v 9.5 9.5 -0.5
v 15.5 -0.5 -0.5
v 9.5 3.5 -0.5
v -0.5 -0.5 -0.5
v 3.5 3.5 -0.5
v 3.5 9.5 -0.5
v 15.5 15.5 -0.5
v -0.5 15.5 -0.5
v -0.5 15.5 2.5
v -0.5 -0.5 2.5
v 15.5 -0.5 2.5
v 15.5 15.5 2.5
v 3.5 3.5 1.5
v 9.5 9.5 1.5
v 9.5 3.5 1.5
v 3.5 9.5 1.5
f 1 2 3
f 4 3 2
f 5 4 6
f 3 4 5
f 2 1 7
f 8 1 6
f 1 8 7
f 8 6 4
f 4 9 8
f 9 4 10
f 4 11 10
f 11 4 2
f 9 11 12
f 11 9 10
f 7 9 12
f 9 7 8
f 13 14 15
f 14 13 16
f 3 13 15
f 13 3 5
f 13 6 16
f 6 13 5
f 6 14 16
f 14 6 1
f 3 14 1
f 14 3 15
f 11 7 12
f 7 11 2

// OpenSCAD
union() {
    translate([0, 0, 0]) color("brown") cube([1, 1, 1],center=true);
    translate([0, 0, 1]) color("brown") cube([1, 1, 1],center=true);
    translate([0, 0, 2]) color("brown") cube([1, 1, 1],center=true);
    translate([0, 1, 0]) color("brown") cube([1, 1, 1],center=true);
    translate([0, 1, 1]) color("brown") cube([1, 1, 1],center=true);
    translate([0, 1, 2]) color("brown") cube([1, 1, 1],center=true);
    translate([0, 2, 0]) color("brown") cube([1, 1, 1],center=true);
    translate([0, 2, 1]) color("brown") cube([1, 1, 1],center=true);
    translate([0, 2, 2]) color("brown") cube([1, 1, 1],center=true);
    translate([0, 3, 0]) color("brown") cube([1, 1, 1],center=true);
    translate([0, 3, 1]) color("brown") cube([1, 1, 1],center=true);
    translate([0, 3, 2]) color("brown") cube([1, 1, 1],center=true);
    translate([0, 4, 0]) color("brown") cube([1, 1, 1],center=true);
    translate([0, 4, 1]) color("brown") cube([1, 1, 1],center=true);
    translate([0, 4, 2]) color("brown") cube([1, 1, 1],center=true);
    translate([0, 5, 0]) color("brown") cube([1, 1, 1],center=true);
    translate([0, 5, 1]) color("brown") cube([1, 1, 1],center=true);
    translate([0, 5, 2]) color("brown") cube([1, 1, 1],center=true);
    translate([0, 6, 0]) color("brown") cube([1, 1, 1],center=true);
    translate([0, 6, 1]) color("brown") cube([1, 1, 1],center=true);
    translate([0, 6, 2]) color("brown") cube([1, 1, 1],center=true);
    translate([0, 7, 0]) color("brown") cube([1, 1, 1],center=true);
    translate([0, 7, 1]) color("brown") cube([1, 1, 1],center=true);
    translate([0, 7, 2]) color("brown") cube([1, 1, 1],center=true);
    translate([0, 8, 0]) color("brown") cube([1, 1, 1],center=true);
    translate([0, 8, 1]) color("brown") cube([1, 1, 1],center=true);
    translate([0, 8, 2]) color("brown") cube([1, 1, 1],center=true);
    translate([0, 9, 0]) color("brown") cube([1, 1, 1],center=true);
    translate([0, 9, 1]) color("brown") cube([1, 1, 1],center=true);
    translate([0, 9, 2]) color("brown") cube([1, 1, 1],center=true);
    translate([0, 10, 0]) color("brown") cube([1, 1, 1],center=true);
    translate([0, 10, 1]) color("brown") cube([1, 1, 1],center=true);
    translate([0, 10, 2]) color("brown") cube([1, 1, 1],center=true);
    translate([0, 11, 0]) color("brown") cube([1, 1, 1],center=true);
    translate([0, 11, 1]) color("brown") cube([1, 1, 1],center=true);
    translate([0, 11, 2]) color("brown") cube([1, 1, 1],center=true);
    translate([0, 12, 0]) color("brown") cube([1, 1, 1],center=true);
    translate([0, 12, 1]) color("brown") cube([1, 1, 1],center=true);
    translate([0, 12, 2]) color("brown") cube([1, 1, 1],center=true);
    translate([0, 13, 0]) color("brown") cube([1, 1, 1],center=true);
    translate([0, 13, 1]) color("brown") cube([1, 1, 1],center=true);
    translate([0, 13, 2]) color("brown") cube([1, 1, 1],center=true);
    translate([0, 14, 0]) color("brown") cube([1, 1, 1],center=true);
    translate([0, 14, 1]) color("brown") cube([1, 1, 1],center=true);
    translate([0, 14, 2]) color("brown") cube([1, 1, 1],center=true);
    translate([0, 15, 0]) color("brown") cube([1, 1, 1],center=true);
    translate([0, 15, 1]) color("brown") cube([1, 1, 1],center=true);
    translate([0, 15, 2]) color("brown") cube([1, 1, 1],center=true);
    translate([1, 0, 0]) color("brown") cube([1, 1, 1],center=true);
    translate([1, 0, 1]) color("brown") cube([1, 1, 1],center=true);
    translate([1, 0, 2]) color("brown") cube([1, 1, 1],center=true);
    translate([1, 1, 0]) color("brown") cube([1, 1, 1],center=true);
    translate([1, 1, 1]) color("brown") cube([1, 1, 1],center=true);
    translate([1, 1, 2]) color("brown") cube([1, 1, 1],center=true);
    translate([1, 2, 0]) color("brown") cube([1, 1, 1],center=true);
    translate([1, 2, 1]) color("brown") cube([1, 1, 1],center=true);
    translate([1, 2, 2]) color("brown") cube([1, 1, 1],center=true);
    translate([1, 3, 0]) color("brown") cube([1, 1, 1],center=true);
    translate([1, 3, 1]) color("brown") cube([1, 1, 1],center=true);
    translate([1, 3, 2]) color("brown") cube([1, 1, 1],center=true);
    translate([1, 4, 0]) color("brown") cube([1, 1, 1],center=true);
    translate([1, 4, 1]) color("brown") cube([1, 1, 1],center=true);
    translate([1, 4, 2]) color("brown") cube([1, 1, 1],center=true);
    translate([1, 5, 0]) color("brown") cube([1, 1, 1],center=true);
    translate([1, 5, 1]) color("brown") cube([1, 1, 1],center=true);
    translate([1, 5, 2]) color("brown") cube([1, 1, 1],center=true);
    translate([1, 6, 0]) color("brown") cube([1, 1, 1],center=true);
    translate([1, 6, 1]) color("brown") cube([1, 1, 1],center=true);
    translate([1, 6, 2]) color("brown") cube([1, 1, 1],center=true);
    translate([1, 7, 0]) color("brown") cube([1, 1, 1],center=true);
    translate([1, 7, 1]) color("brown") cube([1, 1, 1],center=true);
    translate([1, 7, 2]) color("brown") cube([1, 1, 1],center=true);
    translate([1, 8, 0]) color("brown") cube([1, 1, 1],center=true);
    translate([1, 8, 1]) color("brown") cube([1, 1, 1],center=true);
    translate([1, 8, 2]) color("brown") cube([1, 1, 1],center=true);
    translate([1, 9, 0]) color("brown") cube([1, 1, 1],center=true);
    translate([1, 9, 1]) color("brown") cube([1, 1, 1],center=true);
    translate([1, 9, 2]) color("brown") cube([1, 1, 1],center=true);
    translate([1, 10, 0]) color("brown") cube([1, 1, 1],center=true);
    translate([1, 10, 1]) color("brown") cube([1, 1, 1],center=true);
    translate([1, 10, 2]) color("brown") cube([1, 1, 1],center=true);
    translate([1, 11, 0]) color("brown") cube([1, 1, 1],center=true);
    translate([1, 11, 1]) color("brown") cube([1, 1, 1],center=true);
    translate([1, 11, 2]) color("brown") cube([1, 1, 1],center=true);
    translate([1, 12, 0]) color("brown") cube([1, 1, 1],center=true);
    translate([1, 12, 1]) color("brown") cube([1, 1, 1],center=true);
    translate([1, 12, 2]) color("brown") cube([1, 1, 1],center=true);
    translate([1, 13, 0]) color("brown") cube([1, 1, 1],center=true);
    translate([1, 13, 1]) color("brown") cube([1, 1, 1],center=true);
    translate([1, 13, 2]) color("brown") cube([1, 1, 1],center=true);
    translate([1, 14, 0]) color("brown") cube([1, 1, 1],center=true);
    translate([1, 14, 1]) color("brown") cube([1, 1, 1],center=true);
    translate([1, 14, 2]) color("brown") cube([1, 1, 1],center=true);
    translate([1, 15, 0]) color("brown") cube([1, 1, 1],center=true);
    translate([1, 15, 1]) color("brown") cube([1, 1, 1],center=true);
    translate([1, 15, 2]) color("brown") cube([1, 1, 1],center=true);
    translate([2, 0, 0]) color("brown") cube([1, 1, 1],center=true);
    translate([2, 0, 1]) color("brown") cube([1, 1, 1],center=true);
    translate([2, 0, 2]) color("brown") cube([1, 1, 1],center=true);
    translate([2, 1, 0]) color("brown") cube([1, 1, 1],center=true);
    translate([2, 1, 1]) color("brown") cube([1, 1, 1],center=true);
    translate([2, 1, 2]) color("brown") cube([1, 1, 1],center=true);
    translate([2, 2, 0]) color("brown") cube([1, 1, 1],center=true);
    translate([2, 2, 1]) color("brown") cube([1, 1, 1],center=true);
    translate([2, 2, 2]) color("brown") cube([1, 1, 1],center=true);
    translate([2, 3, 0]) color("brown") cube([1, 1, 1],center=true);
    translate([2, 3, 1]) color("brown") cube([1, 1, 1],center=true);
    translate([2, 3, 2]) color("brown") cube([1, 1, 1],center=true);
    translate([2, 4, 0]) color("brown") cube([1, 1, 1],center=true);
    translate([2, 4, 1]) color("brown") cube([1, 1, 1],center=true);
    translate([2, 4, 2]) color("brown") cube([1, 1, 1],center=true);
    translate([2, 5, 0]) color("brown") cube([1, 1, 1],center=true);
    translate([2, 5, 1]) color("brown") cube([1, 1, 1],center=true);
    translate([2, 5, 2]) color("brown") cube([1, 1, 1],center=true);
    translate([2, 6, 0]) color("brown") cube([1, 1, 1],center=true);
    translate([2, 6, 1]) color("brown") cube([1, 1, 1],center=true);
    translate([2, 6, 2]) color("brown") cube([1, 1, 1],center=true);
    translate([2, 7, 0]) color("brown") cube([1, 1, 1],center=true);
    translate([2, 7, 1]) color("brown") cube([1, 1, 1],center=true);
    translate([2, 7, 2]) color("brown") cube([1, 1, 1],center=true);
    translate([2, 8, 0]) color("brown") cube([1, 1, 1],center=true);
    translate([2, 8, 1]) color("brown") cube([1, 1, 1],center=true);
    translate([2, 8, 2]) color("brown") cube([1, 1, 1],center=true);
    translate([2, 9, 0]) color("brown") cube([1, 1, 1],center=true);
    translate([2, 9, 1]) color("brown") cube([1, 1, 1],center=true);
    translate([2, 9, 2]) color("brown") cube([1, 1, 1],center=true);
    translate([2, 10, 0]) color("brown") cube([1, 1, 1],center=true);
    translate([2, 10, 1]) color("brown") cube([1, 1, 1],center=true);
    translate([2, 10, 2]) color("brown") cube([1, 1, 1],center=true);
    translate([2, 11, 0]) color("brown") cube([1, 1, 1],center=true);
    translate([2, 11, 1]) color("brown") cube([1, 1, 1],center=true);
    translate([2, 11, 2]) color("brown") cube([1, 1, 1],center=true);
    translate([2, 12, 0]) color("brown") cube([1, 1, 1],center=true);
    translate([2, 12, 1]) color("brown") cube([1, 1, 1],center=true);
    translate([2, 12, 2]) color("brown") cube([1, 1, 1],center=true);
    translate([2, 13, 0]) color("brown") cube([1, 1, 1],center=true);
    translate([2, 13, 1]) color("brown") cube([1, 1, 1],center=true);
    translate([2, 13, 2]) color("brown") cube([1, 1, 1],center=true);
    translate([2, 14, 0]) color("brown") cube([1, 1, 1],center=true);
    translate([2, 14, 1]) color("brown") cube([1, 1, 1],center=true);
    translate([2, 14, 2]) color("brown") cube([1, 1, 1],center=true);
    translate([2, 15, 0]) color("brown") cube([1, 1, 1],center=true);
    translate([2, 15, 1]) color("brown") cube([1, 1, 1],center=true);
    translate([2, 15, 2]) color("brown") cube([1, 1, 1],center=true);
    translate([3, 0, 0]) color("brown") cube([1, 1, 1],center=true);
    translate([3, 0, 1]) color("brown") cube([1, 1, 1],center=true);
    translate([3, 0, 2]) color("brown") cube([1, 1, 1],center=true);
    translate([3, 1, 0]) color("brown") cube([1, 1, 1],center=true);
    translate([3, 1, 1]) color("brown") cube([1, 1, 1],center=true);
    translate([3, 1, 2]) color("brown") cube([1, 1, 1],center=true);
    translate([3, 2, 0]) color("brown") cube([1, 1, 1],center=true);
    translate([3, 2, 1]) color("brown") cube([1, 1, 1],center=true);
    translate([3, 2, 2]) color("brown") cube([1, 1, 1],center=true);
    translate([3, 3, 0]) color("brown") cube([1, 1, 1],center=true);
    translate([3, 3, 1]) color("brown") cube([1, 1, 1],center=true);
    translate([3, 3, 2]) color("brown") cube([1, 1, 1],center=true);
    translate([3, 4, 0]) color("brown") cube([1, 1, 1],center=true);
    translate([3, 4, 1]) color("brown") cube([1, 1, 1],center=true);
    translate([3, 4, 2]) color("brown") cube([1, 1, 1],center=true);
    translate([3, 5, 0]) color("brown") cube([1, 1, 1],center=true);
    translate([3, 5, 1]) color("brown") cube([1, 1, 1],center=true);
    translate([3, 5, 2]) color("brown") cube([1, 1, 1],center=true);
    translate([3, 6, 0]) color("brown") cube([1, 1, 1],center=true);
    translate([3, 6, 1]) color("brown") cube([1, 1, 1],center=true);
    translate([3, 6, 2]) color("brown") cube([1, 1, 1],center=true);
    translate([3, 7, 0]) color("brown") cube([1, 1, 1],center=true);
    translate([3, 7, 1]) color("brown") cube([1, 1, 1],center=true);
    translate([3, 7, 2]) color("brown") cube([1, 1, 1],center=true);
    translate([3, 8, 0]) color("brown") cube([1, 1, 1],center=true);
    translate([3, 8, 1]) color("brown") cube([1, 1, 1],center=true);
    translate([3, 8, 2]) color("brown") cube([1, 1, 1],center=true);
    translate([3, 9, 0]) color("brown") cube([1, 1, 1],center=true);
    translate([3, 9, 1]) color("brown") cube([1, 1, 1],center=true);
    translate([3, 9, 2]) color("brown") cube([1, 1, 1],center=true);
    translate([3, 10, 0]) color("brown") cube([1, 1, 1],center=true);
    translate([3, 10, 1]) color("brown") cube([1, 1, 1],center=true);
    translate([3, 10, 2]) color("brown") cube([1, 1, 1],center=true);
    translate([3, 11, 0]) color("brown") cube([1, 1, 1],center=true);
    translate([3, 11, 1]) color("brown") cube([1, 1, 1],center=true);
    translate([3, 11, 2]) color("brown") cube([1, 1, 1],center=true);
    translate([3, 12, 0]) color("brown") cube([1, 1, 1],center=true);
    translate([3, 12, 1]) color("brown") cube([1, 1, 1],center=true);
    translate([3, 12, 2]) color("brown") cube([1, 1, 1],center=true);
    translate([3, 13, 0]) color("brown") cube([1, 1, 1],center=true);
    translate([3, 13, 1]) color("brown") cube([1, 1, 1],center=true);
    translate([3, 13, 2]) color("brown") cube([1, 1, 1],center=true);
    translate([3, 14, 0]) color("brown") cube([1, 1, 1],center=true);
    translate([3, 14, 1]) color("brown") cube([1, 1, 1],center=true);
    translate([3, 14, 2]) color("brown") cube([1, 1, 1],center=true);
    translate([3, 15, 0]) color("brown") cube([1, 1, 1],center=true);
    translate([3, 15, 1]) color("brown") cube([1, 1, 1],center=true);
    translate([3, 15, 2]) color("brown") cube([1, 1, 1],center=true);
    translate([4, 0, 0]) color("brown") cube([1, 1, 1],center=true);
    translate([4, 0, 1]) color("brown") cube([1, 1, 1],center=true);
    translate([4, 0, 2]) color("brown") cube([1, 1, 1],center=true);
    translate([4, 1, 0]) color("brown") cube([1, 1, 1],center=true);
    translate([4, 1, 1]) color("brown") cube([1, 1, 1],center=true);
    translate([4, 1, 2]) color("brown") cube([1, 1, 1],center=true);
    translate([4, 2, 0]) color("brown") cube([1, 1, 1],center=true);
    translate([4, 2, 1]) color("brown") cube([1, 1, 1],center=true);
    translate([4, 2, 2]) color("brown") cube([1, 1, 1],center=true);
    translate([4, 3, 0]) color("brown") cube([1, 1, 1],center=true);
    translate([4, 3, 1]) color("brown") cube([1, 1, 1],center=true);
    translate([4, 3, 2]) color("brown") cube([1, 1, 1],center=true);
    translate([4, 4, 2]) color("brown") cube([1, 1, 1],center=true);
    translate([4, 5, 2]) color("brown") cube([1, 1, 1],center=true);
    translate([4, 6, 2]) color("brown") cube([1, 1, 1],center=true);
    translate([4, 7, 2]) color("brown") cube([1, 1, 1],center=true);
    translate([4, 8, 2]) color("brown") cube([1, 1, 1],center=true);
    translate([4, 9, 2]) color("brown") cube([1, 1, 1],center=true);
    translate([4, 10, 0]) color("brown") cube([1, 1, 1],center=true);
    translate([4, 10, 1]) color("brown") cube([1, 1, 1],center=true);
    translate([4, 10, 2]) color("brown") cube([1, 1, 1],center=true);
    translate([4, 11, 0]) color("brown") cube([1, 1, 1],center=true);
    translate([4, 11, 1]) color("brown") cube([1, 1, 1],center=true);
    translate([4, 11, 2]) color("brown") cube([1, 1, 1],center=true);
    translate([4, 12, 0]) color("brown") cube([1, 1, 1],center=true);
    translate([4, 12, 1]) color("brown") cube([1, 1, 1],center=true);
    translate([4, 12, 2]) color("brown") cube([1, 1, 1],center=true);
    translate([4, 13, 0]) color("brown") cube([1, 1, 1],center=true);
    translate([4, 13, 1]) color("brown") cube([1, 1, 1],center=true);
    translate([4, 13, 2]) color("brown") cube([1, 1, 1],center=true);
    translate([4, 14, 0]) color("brown") cube([1, 1, 1],center=true);
    translate([4, 14, 1]) color("brown") cube([1, 1, 1],center=true);
    translate([4, 14, 2]) color("brown") cube([1, 1, 1],center=true);
    translate([4, 15, 0]) color("brown") cube([1, 1, 1],center=true);
    translate([4, 15, 1]) color("brown") cube([1, 1, 1],center=true);
    translate([4, 15, 2]) color("brown") cube([1, 1, 1],center=true);
    translate([5, 0, 0]) color("brown") cube([1, 1, 1],center=true);
    translate([5, 0, 1]) color("brown") cube([1, 1, 1],center=true);
    translate([5, 0, 2]) color("brown") cube([1, 1, 1],center=true);
    translate([5, 1, 0]) color("brown") cube([1, 1, 1],center=true);
    translate([5, 1, 1]) color("brown") cube([1, 1, 1],center=true);
    translate([5, 1, 2]) color("brown") cube([1, 1, 1],center=true);
    translate([5, 2, 0]) color("brown") cube([1, 1, 1],center=true);
    translate([5, 2, 1]) color("brown") cube([1, 1, 1],center=true);
    translate([5, 2, 2]) color("brown") cube([1, 1, 1],center=true);
    translate([5, 3, 0]) color("brown") cube([1, 1, 1],center=true);
    translate([5, 3, 1]) color("brown") cube([1, 1, 1],center=true);
    translate([5, 3, 2]) color("brown") cube([1, 1, 1],center=true);
    translate([5, 4, 2]) color("brown") cube([1, 1, 1],center=true);
    translate([5, 5, 2]) color("brown") cube([1, 1, 1],center=true);
    translate([5, 6, 2]) color("brown") cube([1, 1, 1],center=true);
    translate([5, 7, 2]) color("brown") cube([1, 1, 1],center=true);
    translate([5, 8, 2]) color("brown") cube([1, 1, 1],center=true);
    translate([5, 9, 2]) color("brown") cube([1, 1, 1],center=true);
    translate([5, 10, 0]) color("brown") cube([1, 1, 1],center=true);
    translate([5, 10, 1]) color("brown") cube([1, 1, 1],center=true);
    translate([5, 10, 2]) color("brown") cube([1, 1, 1],center=true);
    translate([5, 11, 0]) color("brown") cube([1, 1, 1],center=true);
    translate([5, 11, 1]) color("brown") cube([1, 1, 1],center=true);
    translate([5, 11, 2]) color("brown") cube([1, 1, 1],center=true);
    translate([5, 12, 0]) color("brown") cube([1, 1, 1],center=true);
    translate([5, 12, 1]) color("brown") cube([1, 1, 1],center=true);
    translate([5, 12, 2]) color("brown") cube([1, 1, 1],center=true);
    translate([5, 13, 0]) color("brown") cube([1, 1, 1],center=true);
    translate([5, 13, 1]) color("brown") cube([1, 1, 1],center=true);
    translate([5, 13, 2]) color("brown") cube([1, 1, 1],center=true);
    translate([5, 14, 0]) color("brown") cube([1, 1, 1],center=true);
    translate([5, 14, 1]) color("brown") cube([1, 1, 1],center=true);
    translate([5, 14, 2]) color("brown") cube([1, 1, 1],center=true);
    translate([5, 15, 0]) color("brown") cube([1, 1, 1],center=true);
    translate([5, 15, 1]) color("brown") cube([1, 1, 1],center=true);
    translate([5, 15, 2]) color("brown") cube([1, 1, 1],center=true);
    translate([6, 0, 0]) color("brown") cube([1, 1, 1],center=true);
    translate([6, 0, 1]) color("brown") cube([1, 1, 1],center=true);
    translate([6, 0, 2]) color("brown") cube([1, 1, 1],center=true);
    translate([6, 1, 0]) color("brown") cube([1, 1, 1],center=true);
    translate([6, 1, 1]) color("brown") cube([1, 1, 1],center=true);
    translate([6, 1, 2]) color("brown") cube([1, 1, 1],center=true);
    translate([6, 2, 0]) color("brown") cube([1, 1, 1],center=true);
    translate([6, 2, 1]) color("brown") cube([1, 1, 1],center=true);
    translate([6, 2, 2]) color("brown") cube([1, 1, 1],center=true);
    translate([6, 3, 0]) color("brown") cube([1, 1, 1],center=true);
    translate([6, 3, 1]) color("brown") cube([1, 1, 1],center=true);
    translate([6, 3, 2]) color("brown") cube([1, 1, 1],center=true);
    translate([6, 4, 2]) color("brown") cube([1, 1, 1],center=true);
    translate([6, 5, 2]) color("brown") cube([1, 1, 1],center=true);
    translate([6, 6, 2]) color("brown") cube([1, 1, 1],center=true);
    translate([6, 7, 2]) color("brown") cube([1, 1, 1],center=true);
    translate([6, 8, 2]) color("brown") cube([1, 1, 1],center=true);
    translate([6, 9, 2]) color("brown") cube([1, 1, 1],center=true);
    translate([6, 10, 0]) color("brown") cube([1, 1, 1],center=true);
    translate([6, 10, 1]) color("brown") cube([1, 1, 1],center=true);
    translate([6, 10, 2]) color("brown") cube([1, 1, 1],center=true);
    translate([6, 11, 0]) color("brown") cube([1, 1, 1],center=true);
    translate([6, 11, 1]) color("brown") cube([1, 1, 1],center=true);
    translate([6, 11, 2]) color("brown") cube([1, 1, 1],center=true);
    translate([6, 12, 0]) color("brown") cube([1, 1, 1],center=true);
    translate([6, 12, 1]) color("brown") cube([1, 1, 1],center=true);
    translate([6, 12, 2]) color("brown") cube([1, 1, 1],center=true);
    translate([6, 13, 0]) color("brown") cube([1, 1, 1],center=true);
    translate([6, 13, 1]) color("brown") cube([1, 1, 1],center=true);
    translate([6, 13, 2]) color("brown") cube([1, 1, 1],center=true);
    translate([6, 14, 0]) color("brown") cube([1, 1, 1],center=true);
    translate([6, 14, 1]) color("brown") cube([1, 1, 1],center=true);
    translate([6, 14, 2]) color("brown") cube([1, 1, 1],center=true);
    translate([6, 15, 0]) color("brown") cube([1, 1, 1],center=true);
    translate([6, 15, 1]) color("brown") cube([1, 1, 1],center=true);
    translate([6, 15, 2]) color("brown") cube([1, 1, 1],center=true);
    translate([7, 0, 0]) color("brown") cube([1, 1, 1],center=true);
    translate([7, 0, 1]) color("brown") cube([1, 1, 1],center=true);
    translate([7, 0, 2]) color("brown") cube([1, 1, 1],center=true);
    translate([7, 1, 0]) color("brown") cube([1, 1, 1],center=true);
    translate([7, 1, 1]) color("brown") cube([1, 1, 1],center=true);
    translate([7, 1, 2]) color("brown") cube([1, 1, 1],center=true);
    translate([7, 2, 0]) color("brown") cube([1, 1, 1],center=true);
    translate([7, 2, 1]) color("brown") cube([1, 1, 1],center=true);
    translate([7, 2, 2]) color("brown") cube([1, 1, 1],center=true);
    translate([7, 3, 0]) color("brown") cube([1, 1, 1],center=true);
    translate([7, 3, 1]) color("brown") cube([1, 1, 1],center=true);
    translate([7, 3, 2]) color("brown") cube([1, 1, 1],center=true);
    translate([7, 4, 2]) color("brown") cube([1, 1, 1],center=true);
    translate([7, 5, 2]) color("brown") cube([1, 1, 1],center=true);
    translate([7, 6, 2]) color("brown") cube([1, 1, 1],center=true);
    translate([7, 7, 2]) color("brown") cube([1, 1, 1],center=true);
    translate([7, 8, 2]) color("brown") cube([1, 1, 1],center=true);
    translate([7, 9, 2]) color("brown") cube([1, 1, 1],center=true);
    translate([7, 10, 0]) color("brown") cube([1, 1, 1],center=true);
    translate([7, 10, 1]) color("brown") cube([1, 1, 1],center=true);
    translate([7, 10, 2]) color("brown") cube([1, 1, 1],center=true);
    translate([7, 11, 0]) color("brown") cube([1, 1, 1],center=true);
    translate([7, 11, 1]) color("brown") cube([1, 1, 1],center=true);
    translate([7, 11, 2]) color("brown") cube([1, 1, 1],center=true);
    translate([7, 12, 0]) color("brown") cube([1, 1, 1],center=true);
    translate([7, 12, 1]) color("brown") cube([1, 1, 1],center=true);
    translate([7, 12, 2]) color("brown") cube([1, 1, 1],center=true);
    translate([7, 13, 0]) color("brown") cube([1, 1, 1],center=true);
    translate([7, 13, 1]) color("brown") cube([1, 1, 1],center=true);
    translate([7, 13, 2]) color("brown") cube([1, 1, 1],center=true);
    translate([7, 14, 0]) color("brown") cube([1, 1, 1],center=true);
    translate([7, 14, 1]) color("brown") cube([1, 1, 1],center=true);
    translate([7, 14, 2]) color("brown") cube([1, 1, 1],center=true);
    translate([7, 15, 0]) color("brown") cube([1, 1, 1],center=true);
    translate([7, 15, 1]) color("brown") cube([1, 1, 1],center=true);
    translate([7, 15, 2]) color("brown") cube([1, 1, 1],center=true);
    translate([8, 0, 0]) color("brown") cube([1, 1, 1],center=true);
    translate([8, 0, 1]) color("brown") cube([1, 1, 1],center=true);
    translate([8, 0, 2]) color("brown") cube([1, 1, 1],center=true);
    translate([8, 1, 0]) color("brown") cube([1, 1, 1],center=true);
    translate([8, 1, 1]) color("brown") cube([1, 1, 1],center=true);
    translate([8, 1, 2]) color("brown") cube([1, 1, 1],center=true);
    translate([8, 2, 0]) color("brown") cube([1, 1, 1],center=true);
    translate([8, 2, 1]) color("brown") cube([1, 1, 1],center=true);
    translate([8, 2, 2]) color("brown") cube([1, 1, 1],center=true);
    translate([8, 3, 0]) color("brown") cube([1, 1, 1],center=true);
    translate([8, 3, 1]) color("brown") cube([1, 1, 1],center=true);
    translate([8, 3, 2]) color("brown") cube([1, 1, 1],center=true);
    translate([8, 4, 2]) color("brown") cube([1, 1, 1],center=true);
    translate([8, 5, 2]) color("brown") cube([1, 1, 1],center=true);
    translate([8, 6, 2]) color("brown") cube([1, 1, 1],center=true);
    translate([8, 7, 2]) color("brown") cube([1, 1, 1],center=true);
    translate([8, 8, 2]) color("brown") cube([1, 1, 1],center=true);
    translate([8, 9, 2]) color("brown") cube([1, 1, 1],center=true);
    translate([8, 10, 0]) color("brown") cube([1, 1, 1],center=true);
    translate([8, 10, 1]) color("brown") cube([1, 1, 1],center=true);
    translate([8, 10, 2]) color("brown") cube([1, 1, 1],center=true);
    translate([8, 11, 0]) color("brown") cube([1, 1, 1],center=true);
    translate([8, 11, 1]) color("brown") cube([1, 1, 1],center=true);
    translate([8, 11, 2]) color("brown") cube([1, 1, 1],center=true);
    translate([8, 12, 0]) color("brown") cube([1, 1, 1],center=true);
    translate([8, 12, 1]) color("brown") cube([1, 1, 1],center=true);
    translate([8, 12, 2]) color("brown") cube([1, 1, 1],center=true);
    translate([8, 13, 0]) color("brown") cube([1, 1, 1],center=true);
    translate([8, 13, 1]) color("brown") cube([1, 1, 1],center=true);
    translate([8, 13, 2]) color("brown") cube([1, 1, 1],center=true);
    translate([8, 14, 0]) color("brown") cube([1, 1, 1],center=true);
    translate([8, 14, 1]) color("brown") cube([1, 1, 1],center=true);
    translate([8, 14, 2]) color("brown") cube([1, 1, 1],center=true);
    translate([8, 15, 0]) color("brown") cube([1, 1, 1],center=true);
    translate([8, 15, 1]) color("brown") cube([1, 1, 1],center=true);
    translate([8, 15, 2]) color("brown") cube([1, 1, 1],center=true);
    translate([9, 0, 0]) color("brown") cube([1, 1, 1],center=true);
    translate([9, 0, 1]) color("brown") cube([1, 1, 1],center=true);
    translate([9, 0, 2]) color("brown") cube([1, 1, 1],center=true);
    translate([9, 1, 0]) color("brown") cube([1, 1, 1],center=true);
    translate([9, 1, 1]) color("brown") cube([1, 1, 1],center=true);
    translate([9, 1, 2]) color("brown") cube([1, 1, 1],center=true);
    translate([9, 2, 0]) color("brown") cube([1, 1, 1],center=true);
    translate([9, 2, 1]) color("brown") cube([1, 1, 1],center=true);
    translate([9, 2, 2]) color("brown") cube([1, 1, 1],center=true);
    translate([9, 3, 0]) color("brown") cube([1, 1, 1],center=true);
    translate([9, 3, 1]) color("brown") cube([1, 1, 1],center=true);
    translate([9, 3, 2]) color("brown") cube([1, 1, 1],center=true);
    translate([9, 4, 2]) color("brown") cube([1, 1, 1],center=true);
    translate([9, 5, 2]) color("brown") cube([1, 1, 1],center=true);
    translate([9, 6, 2]) color("brown") cube([1, 1, 1],center=true);
    translate([9, 7, 2]) color("brown") cube([1, 1, 1],center=true);
    translate([9, 8, 2]) color("brown") cube([1, 1, 1],center=true);
    translate([9, 9, 2]) color("brown") cube([1, 1, 1],center=true);
    translate([9, 10, 0]) color("brown") cube([1, 1, 1],center=true);
    translate([9, 10, 1]) color("brown") cube([1, 1, 1],center=true);
    translate([9, 10, 2]) color("brown") cube([1, 1, 1],center=true);
    translate([9, 11, 0]) color("brown") cube([1, 1, 1],center=true);
    translate([9, 11, 1]) color("brown") cube([1, 1, 1],center=true);
    translate([9, 11, 2]) color("brown") cube([1, 1, 1],center=true);
    translate([9, 12, 0]) color("brown") cube([1, 1, 1],center=true);
    translate([9, 12, 1]) color("brown") cube([1, 1, 1],center=true);
    translate([9, 12, 2]) color("brown") cube([1, 1, 1],center=true);
    translate([9, 13, 0]) color("brown") cube([1, 1, 1],center=true);
    translate([9, 13, 1]) color("brown") cube([1, 1, 1],center=true);
    translate([9, 13, 2]) color("brown") cube([1, 1, 1],center=true);
    translate([9, 14, 0]) color("brown") cube([1, 1, 1],center=true);
    translate([9, 14, 1]) color("brown") cube([1, 1, 1],center=true);
    translate([9, 14, 2]) color("brown") cube([1, 1, 1],center=true);
    translate([9, 15, 0]) color("brown") cube([1, 1, 1],center=true);
    translate([9, 15, 1]) color("brown") cube([1, 1, 1],center=true);
    translate([9, 15, 2]) color("brown") cube([1, 1, 1],center=true);
    translate([10, 0, 0]) color("brown") cube([1, 1, 1],center=true);
    translate([10, 0, 1]) color("brown") cube([1, 1, 1],center=true);
    translate([10, 0, 2]) color("brown") cube([1, 1, 1],center=true);
    translate([10, 1, 0]) color("brown") cube([1, 1, 1],center=true);
    translate([10, 1, 1]) color("brown") cube([1, 1, 1],center=true);
    translate([10, 1, 2]) color("brown") cube([1, 1, 1],center=true);
    translate([10, 2, 0]) color("brown") cube([1, 1, 1],center=true);
    translate([10, 2, 1]) color("brown") cube([1, 1, 1],center=true);
    translate([10, 2, 2]) color("brown") cube([1, 1, 1],center=true);
    translate([10, 3, 0]) color("brown") cube([1, 1, 1],center=true);
    translate([10, 3, 1]) color("brown") cube([1, 1, 1],center=true);
    translate([10, 3, 2]) color("brown") cube([1, 1, 1],center=true);
    translate([10, 4, 0]) color("brown") cube([1, 1, 1],center=true);
    translate([10, 4, 1]) color("brown") cube([1, 1, 1],center=true);
    translate([10, 4, 2]) color("brown") cube([1, 1, 1],center=true);
    translate([10, 5, 0]) color("brown") cube([1, 1, 1],center=true);
    translate([10, 5, 1]) color("brown") cube([1, 1, 1],center=true);
    translate([10, 5, 2]) color("brown") cube([1, 1, 1],center=true);
    translate([10, 6, 0]) color("brown") cube([1, 1, 1],center=true);
    translate([10, 6, 1]) color("brown") cube([1, 1, 1],center=true);
    translate([10, 6, 2]) color("brown") cube([1, 1, 1],center=true);
    translate([10, 7, 0]) color("brown") cube([1, 1, 1],center=true);
    translate([10, 7, 1]) color("brown") cube([1, 1, 1],center=true);
    translate([10, 7, 2]) color("brown") cube([1, 1, 1],center=true);
    translate([10, 8, 0]) color("brown") cube([1, 1, 1],center=true);
    translate([10, 8, 1]) color("brown") cube([1, 1, 1],center=true);
    translate([10, 8, 2]) color("brown") cube([1, 1, 1],center=true);
    translate([10, 9, 0]) color("brown") cube([1, 1, 1],center=true);
    translate([10, 9, 1]) color("brown") cube([1, 1, 1],center=true);
    translate([10, 9, 2]) color("brown") cube([1, 1, 1],center=true);
    translate([10, 10, 0]) color("brown") cube([1, 1, 1],center=true);
    translate([10, 10, 1]) color("brown") cube([1, 1, 1],center=true);
    translate([10, 10, 2]) color("brown") cube([1, 1, 1],center=true);
    translate([10, 11, 0]) color("brown") cube([1, 1, 1],center=true);
    translate([10, 11, 1]) color("brown") cube([1, 1, 1],center=true);
    translate([10, 11, 2]) color("brown") cube([1, 1, 1],center=true);
    translate([10, 12, 0]) color("brown") cube([1, 1, 1],center=true);
    translate([10, 12, 1]) color("brown") cube([1, 1, 1],center=true);
    translate([10, 12, 2]) color("brown") cube([1, 1, 1],center=true);
    translate([10, 13, 0]) color("brown") cube([1, 1, 1],center=true);
    translate([10, 13, 1]) color("brown") cube([1, 1, 1],center=true);
    translate([10, 13, 2]) color("brown") cube([1, 1, 1],center=true);
    translate([10, 14, 0]) color("brown") cube([1, 1, 1],center=true);
    translate([10, 14, 1]) color("brown") cube([1, 1, 1],center=true);
    translate([10, 14, 2]) color("brown") cube([1, 1, 1],center=true);
    translate([10, 15, 0]) color("brown") cube([1, 1, 1],center=true);
    translate([10, 15, 1]) color("brown") cube([1, 1, 1],center=true);
    translate([10, 15, 2]) color("brown") cube([1, 1, 1],center=true);
    translate([11, 0, 0]) color("brown") cube([1, 1, 1],center=true);
    translate([11, 0, 1]) color("brown") cube([1, 1, 1],center=true);
    translate([11, 0, 2]) color("brown") cube([1, 1, 1],center=true);
    translate([11, 1, 0]) color("brown") cube([1, 1, 1],center=true);
    translate([11, 1, 1]) color("brown") cube([1, 1, 1],center=true);
    translate([11, 1, 2]) color("brown") cube([1, 1, 1],center=true);
    translate([11, 2, 0]) color("brown") cube([1, 1, 1],center=true);
    translate([11, 2, 1]) color("brown") cube([1, 1, 1],center=true);
    translate([11, 2, 2]) color("brown") cube([1, 1, 1],center=true);
    translate([11, 3, 0]) color("brown") cube([1, 1, 1],center=true);
    translate([11, 3, 1]) color("brown") cube([1, 1, 1],center=true);
    translate([11, 3, 2]) color("brown") cube([1, 1, 1],center=true);
    translate([11, 4, 0]) color("brown") cube([1, 1, 1],center=true);
    translate([11, 4, 1]) color("brown") cube([1, 1, 1],center=true);
    translate([11, 4, 2]) color("brown") cube([1, 1, 1],center=true);
    translate([11, 5, 0]) color("brown") cube([1, 1, 1],center=true);
    translate([11, 5, 1]) color("brown") cube([1, 1, 1],center=true);
    translate([11, 5, 2]) color("brown") cube([1, 1, 1],center=true);
    translate([11, 6, 0]) color("brown") cube([1, 1, 1],center=true);
    translate([11, 6, 1]) color("brown") cube([1, 1, 1],center=true);
    translate([11, 6, 2]) color("brown") cube([1, 1, 1],center=true);
    translate([11, 7, 0]) color("brown") cube([1, 1, 1],center=true);
    translate([11, 7, 1]) color("brown") cube([1, 1, 1],center=true);
    translate([11, 7, 2]) color("brown") cube([1, 1, 1],center=true);
    translate([11, 8, 0]) color("brown") cube([1, 1, 1],center=true);
    translate([11, 8, 1]) color("brown") cube([1, 1, 1],center=true);
    translate([11, 8, 2]) color("brown") cube([1, 1, 1],center=true);
    translate([11, 9, 0]) color("brown") cube([1, 1, 1],center=true);
    translate([11, 9, 1]) color("brown") cube([1, 1, 1],center=true);
    translate([11, 9, 2]) color("brown") cube([1, 1, 1],center=true);
    translate([11, 10, 0]) color("brown") cube([1, 1, 1],center=true);
    translate([11, 10, 1]) color("brown") cube([1, 1, 1],center=true);
    translate([11, 10, 2]) color("brown") cube([1, 1, 1],center=true);
    translate([11, 11, 0]) color("brown") cube([1, 1, 1],center=true);
    translate([11, 11, 1]) color("brown") cube([1, 1, 1],center=true);
    translate([11, 11, 2]) color("brown") cube([1, 1, 1],center=true);
    translate([11, 12, 0]) color("brown") cube([1, 1, 1],center=true);
    translate([11, 12, 1]) color("brown") cube([1, 1, 1],center=true);
    translate([11, 12, 2]) color("brown") cube([1, 1, 1],center=true);
    translate([11, 13, 0]) color("brown") cube([1, 1, 1],center=true);
    translate([11, 13, 1]) color("brown") cube([1, 1, 1],center=true);
    translate([11, 13, 2]) color("brown") cube([1, 1, 1],center=true);
    translate([11, 14, 0]) color("brown") cube([1, 1, 1],center=true);
    translate([11, 14, 1]) color("brown") cube([1, 1, 1],center=true);
    translate([11, 14, 2]) color("brown") cube([1, 1, 1],center=true);
    translate([11, 15, 0]) color("brown") cube([1, 1, 1],center=true);
    translate([11, 15, 1]) color("brown") cube([1, 1, 1],center=true);
    translate([11, 15, 2]) color("brown") cube([1, 1, 1],center=true);
    translate([12, 0, 0]) color("brown") cube([1, 1, 1],center=true);
    translate([12, 0, 1]) color("brown") cube([1, 1, 1],center=true);
    translate([12, 0, 2]) color("brown") cube([1, 1, 1],center=true);
    translate([12, 1, 0]) color("brown") cube([1, 1, 1],center=true);
    translate([12, 1, 1]) color("brown") cube([1, 1, 1],center=true);
    translate([12, 1, 2]) color("brown") cube([1, 1, 1],center=true);
    translate([12, 2, 0]) color("brown") cube([1, 1, 1],center=true);
    translate([12, 2, 1]) color("brown") cube([1, 1, 1],center=true);
    translate([12, 2, 2]) color("brown") cube([1, 1, 1],center=true);
    translate([12, 3, 0]) color("brown") cube([1, 1, 1],center=true);
    translate([12, 3, 1]) color("brown") cube([1, 1, 1],center=true);
    translate([12, 3, 2]) color("brown") cube([1, 1, 1],center=true);
    translate([12, 4, 0]) color("brown") cube([1, 1, 1],center=true);
    translate([12, 4, 1]) color("brown") cube([1, 1, 1],center=true);
    translate([12, 4, 2]) color("brown") cube([1, 1, 1],center=true);
    translate([12, 5, 0]) color("brown") cube([1, 1, 1],center=true);
    translate([12, 5, 1]) color("brown") cube([1, 1, 1],center=true);
    translate([12, 5, 2]) color("brown") cube([1, 1, 1],center=true);
    translate([12, 6, 0]) color("brown") cube([1, 1, 1],center=true);
    translate([12, 6, 1]) color("brown") cube([1, 1, 1],center=true);
    translate([12, 6, 2]) color("brown") cube([1, 1, 1],center=true);
    translate([12, 7, 0]) color("brown") cube([1, 1, 1],center=true);
    translate([12, 7, 1]) color("brown") cube([1, 1, 1],center=true);
    translate([12, 7, 2]) color("brown") cube([1, 1, 1],center=true);
    translate([12, 8, 0]) color("brown") cube([1, 1, 1],center=true);
    translate([12, 8, 1]) color("brown") cube([1, 1, 1],center=true);
    translate([12, 8, 2]) color("brown") cube([1, 1, 1],center=true);
    translate([12, 9, 0]) color("brown") cube([1, 1, 1],center=true);
    translate([12, 9, 1]) color("brown") cube([1, 1, 1],center=true);
    translate([12, 9, 2]) color("brown") cube([1, 1, 1],center=true);
    translate([12, 10, 0]) color("brown") cube([1, 1, 1],center=true);
    translate([12, 10, 1]) color("brown") cube([1, 1, 1],center=true);
    translate([12, 10, 2]) color("brown") cube([1, 1, 1],center=true);
    translate([12, 11, 0]) color("brown") cube([1, 1, 1],center=true);
    translate([12, 11, 1]) color("brown") cube([1, 1, 1],center=true);
    translate([12, 11, 2]) color("brown") cube([1, 1, 1],center=true);
    translate([12, 12, 0]) color("brown") cube([1, 1, 1],center=true);
    translate([12, 12, 1]) color("brown") cube([1, 1, 1],center=true);
    translate([12, 12, 2]) color("brown") cube([1, 1, 1],center=true);
    translate([12, 13, 0]) color("brown") cube([1, 1, 1],center=true);
    translate([12, 13, 1]) color("brown") cube([1, 1, 1],center=true);
    translate([12, 13, 2]) color("brown") cube([1, 1, 1],center=true);
    translate([12, 14, 0]) color("brown") cube([1, 1, 1],center=true);
    translate([12, 14, 1]) color("brown") cube([1, 1, 1],center=true);
    translate([12, 14, 2]) color("brown") cube([1, 1, 1],center=true);
    translate([12, 15, 0]) color("brown") cube([1, 1, 1],center=true);
    translate([12, 15, 1]) color("brown") cube([1, 1, 1],center=true);
    translate([12, 15, 2]) color("brown") cube([1, 1, 1],center=true);
    translate([13, 0, 0]) color("brown") cube([1, 1, 1],center=true);
    translate([13, 0, 1]) color("brown") cube([1, 1, 1],center=true);
    translate([13, 0, 2]) color("brown") cube([1, 1, 1],center=true);
    translate([13, 1, 0]) color("brown") cube([1, 1, 1],center=true);
    translate([13, 1, 1]) color("brown") cube([1, 1, 1],center=true);
    translate([13, 1, 2]) color("brown") cube([1, 1, 1],center=true);
    translate([13, 2, 0]) color("brown") cube([1, 1, 1],center=true);
    translate([13, 2, 1]) color("brown") cube([1, 1, 1],center=true);
    translate([13, 2, 2]) color("brown") cube([1, 1, 1],center=true);
    translate([13, 3, 0]) color("brown") cube([1, 1, 1],center=true);
    translate([13, 3, 1]) color("brown") cube([1, 1, 1],center=true);
    translate([13, 3, 2]) color("brown") cube([1, 1, 1],center=true);
    translate([13, 4, 0]) color("brown") cube([1, 1, 1],center=true);
    translate([13, 4, 1]) color("brown") cube([1, 1, 1],center=true);
    translate([13, 4, 2]) color("brown") cube([1, 1, 1],center=true);
    translate([13, 5, 0]) color("brown") cube([1, 1, 1],center=true);
    translate([13, 5, 1]) color("brown") cube([1, 1, 1],center=true);
    translate([13, 5, 2]) color("brown") cube([1, 1, 1],center=true);
    translate([13, 6, 0]) color("brown") cube([1, 1, 1],center=true);
    translate([13, 6, 1]) color("brown") cube([1, 1, 1],center=true);
    translate([13, 6, 2]) color("brown") cube([1, 1, 1],center=true);
    translate([13, 7, 0]) color("brown") cube([1, 1, 1],center=true);
    translate([13, 7, 1]) color("brown") cube([1, 1, 1],center=true);
    translate([13, 7, 2]) color("brown") cube([1, 1, 1],center=true);
    translate([13, 8, 0]) color("brown") cube([1, 1, 1],center=true);
    translate([13, 8, 1]) color("brown") cube([1, 1, 1],center=true);
    translate([13, 8, 2]) color("brown") cube([1, 1, 1],center=true);
    translate([13, 9, 0]) color("brown") cube([1, 1, 1],center=true);
    translate([13, 9, 1]) color("brown") cube([1, 1, 1],center=true);
    translate([13, 9, 2]) color("brown") cube([1, 1, 1],center=true);
    translate([13, 10, 0]) color("brown") cube([1, 1, 1],center=true);
    translate([13, 10, 1]) color("brown") cube([1, 1, 1],center=true);
    translate([13, 10, 2]) color("brown") cube([1, 1, 1],center=true);
    translate([13, 11, 0]) color("brown") cube([1, 1, 1],center=true);
    translate([13, 11, 1]) color("brown") cube([1, 1, 1],center=true);
    translate([13, 11, 2]) color("brown") cube([1, 1, 1],center=true);
    translate([13, 12, 0]) color("brown") cube([1, 1, 1],center=true);
    translate([13, 12, 1]) color("brown") cube([1, 1, 1],center=true);
    translate([13, 12, 2]) color("brown") cube([1, 1, 1],center=true);
    translate([13, 13, 0]) color("brown") cube([1, 1, 1],center=true);
    translate([13, 13, 1]) color("brown") cube([1, 1, 1],center=true);
    translate([13, 13, 2]) color("brown") cube([1, 1, 1],center=true);
    translate([13, 14, 0]) color("brown") cube([1, 1, 1],center=true);
    translate([13, 14, 1]) color("brown") cube([1, 1, 1],center=true);
    translate([13, 14, 2]) color("brown") cube([1, 1, 1],center=true);
    translate([13, 15, 0]) color("brown") cube([1, 1, 1],center=true);
    translate([13, 15, 1]) color("brown") cube([1, 1, 1],center=true);
    translate([13, 15, 2]) color("brown") cube([1, 1, 1],center=true);
    translate([14, 0, 0]) color("brown") cube([1, 1, 1],center=true);
    translate([14, 0, 1]) color("brown") cube([1, 1, 1],center=true);
    translate([14, 0, 2]) color("brown") cube([1, 1, 1],center=true);
    translate([14, 1, 0]) color("brown") cube([1, 1, 1],center=true);
    translate([14, 1, 1]) color("brown") cube([1, 1, 1],center=true);
    translate([14, 1, 2]) color("brown") cube([1, 1, 1],center=true);
    translate([14, 2, 0]) color("brown") cube([1, 1, 1],center=true);
    translate([14, 2, 1]) color("brown") cube([1, 1, 1],center=true);
    translate([14, 2, 2]) color("brown") cube([1, 1, 1],center=true);
    translate([14, 3, 0]) color("brown") cube([1, 1, 1],center=true);
    translate([14, 3, 1]) color("brown") cube([1, 1, 1],center=true);
    translate([14, 3, 2]) color("brown") cube([1, 1, 1],center=true);
    translate([14, 4, 0]) color("brown") cube([1, 1, 1],center=true);
    translate([14, 4, 1]) color("brown") cube([1, 1, 1],center=true);
    translate([14, 4, 2]) color("brown") cube([1, 1, 1],center=true);
    translate([14, 5, 0]) color("brown") cube([1, 1, 1],center=true);
    translate([14, 5, 1]) color("brown") cube([1, 1, 1],center=true);
    translate([14, 5, 2]) color("brown") cube([1, 1, 1],center=true);
    translate([14, 6, 0]) color("brown") cube([1, 1, 1],center=true);
    translate([14, 6, 1]) color("brown") cube([1, 1, 1],center=true);
    translate([14, 6, 2]) color("brown") cube([1, 1, 1],center=true);
    translate([14, 7, 0]) color("brown") cube([1, 1, 1],center=true);
    translate([14, 7, 1]) color("brown") cube([1, 1, 1],center=true);
    translate([14, 7, 2]) color("brown") cube([1, 1, 1],center=true);
    translate([14, 8, 0]) color("brown") cube([1, 1, 1],center=true);
    translate([14, 8, 1]) color("brown") cube([1, 1, 1],center=true);
    translate([14, 8, 2]) color("brown") cube([1, 1, 1],center=true);
    translate([14, 9, 0]) color("brown") cube([1, 1, 1],center=true);
    translate([14, 9, 1]) color("brown") cube([1, 1, 1],center=true);
    translate([14, 9, 2]) color("brown") cube([1, 1, 1],center=true);
    translate([14, 10, 0]) color("brown") cube([1, 1, 1],center=true);
    translate([14, 10, 1]) color("brown") cube([1, 1, 1],center=true);
    translate([14, 10, 2]) color("brown") cube([1, 1, 1],center=true);
    translate([14, 11, 0]) color("brown") cube([1, 1, 1],center=true);
    translate([14, 11, 1]) color("brown") cube([1, 1, 1],center=true);
    translate([14, 11, 2]) color("brown") cube([1, 1, 1],center=true);
    translate([14, 12, 0]) color("brown") cube([1, 1, 1],center=true);
    translate([14, 12, 1]) color("brown") cube([1, 1, 1],center=true);
    translate([14, 12, 2]) color("brown") cube([1, 1, 1],center=true);
    translate([14, 13, 0]) color("brown") cube([1, 1, 1],center=true);
    translate([14, 13, 1]) color("brown") cube([1, 1, 1],center=true);
    translate([14, 13, 2]) color("brown") cube([1, 1, 1],center=true);
    translate([14, 14, 0]) color("brown") cube([1, 1, 1],center=true);
    translate([14, 14, 1]) color("brown") cube([1, 1, 1],center=true);
    translate([14, 14, 2]) color("brown") cube([1, 1, 1],center=true);
    translate([14, 15, 0]) color("brown") cube([1, 1, 1],center=true);
    translate([14, 15, 1]) color("brown") cube([1, 1, 1],center=true);
    translate([14, 15, 2]) color("brown") cube([1, 1, 1],center=true);
    translate([15, 0, 0]) color("brown") cube([1, 1, 1],center=true);
    translate([15, 0, 1]) color("brown") cube([1, 1, 1],center=true);
    translate([15, 0, 2]) color("brown") cube([1, 1, 1],center=true);
    translate([15, 1, 0]) color("brown") cube([1, 1, 1],center=true);
    translate([15, 1, 1]) color("brown") cube([1, 1, 1],center=true);
    translate([15, 1, 2]) color("brown") cube([1, 1, 1],center=true);
    translate([15, 2, 0]) color("brown") cube([1, 1, 1],center=true);
    translate([15, 2, 1]) color("brown") cube([1, 1, 1],center=true);
    translate([15, 2, 2]) color("brown") cube([1, 1, 1],center=true);
    translate([15, 3, 0]) color("brown") cube([1, 1, 1],center=true);
    translate([15, 3, 1]) color("brown") cube([1, 1, 1],center=true);
    translate([15, 3, 2]) color("brown") cube([1, 1, 1],center=true);
    translate([15, 4, 0]) color("brown") cube([1, 1, 1],center=true);
    translate([15, 4, 1]) color("brown") cube([1, 1, 1],center=true);
    translate([15, 4, 2]) color("brown") cube([1, 1, 1],center=true);
    translate([15, 5, 0]) color("brown") cube([1, 1, 1],center=true);
    translate([15, 5, 1]) color("brown") cube([1, 1, 1],center=true);
    translate([15, 5, 2]) color("brown") cube([1, 1, 1],center=true);
    translate([15, 6, 0]) color("brown") cube([1, 1, 1],center=true);
    translate([15, 6, 1]) color("brown") cube([1, 1, 1],center=true);
    translate([15, 6, 2]) color("brown") cube([1, 1, 1],center=true);
    translate([15, 7, 0]) color("brown") cube([1, 1, 1],center=true);
    translate([15, 7, 1]) color("brown") cube([1, 1, 1],center=true);
    translate([15, 7, 2]) color("brown") cube([1, 1, 1],center=true);
    translate([15, 8, 0]) color("brown") cube([1, 1, 1],center=true);
    translate([15, 8, 1]) color("brown") cube([1, 1, 1],center=true);
    translate([15, 8, 2]) color("brown") cube([1, 1, 1],center=true);
    translate([15, 9, 0]) color("brown") cube([1, 1, 1],center=true);
    translate([15, 9, 1]) color("brown") cube([1, 1, 1],center=true);
    translate([15, 9, 2]) color("brown") cube([1, 1, 1],center=true);
    translate([15, 10, 0]) color("brown") cube([1, 1, 1],center=true);
    translate([15, 10, 1]) color("brown") cube([1, 1, 1],center=true);
    translate([15, 10, 2]) color("brown") cube([1, 1, 1],center=true);
    translate([15, 11, 0]) color("brown") cube([1, 1, 1],center=true);
    translate([15, 11, 1]) color("brown") cube([1, 1, 1],center=true);
    translate([15, 11, 2]) color("brown") cube([1, 1, 1],center=true);
    translate([15, 12, 0]) color("brown") cube([1, 1, 1],center=true);
    translate([15, 12, 1]) color("brown") cube([1, 1, 1],center=true);
    translate([15, 12, 2]) color("brown") cube([1, 1, 1],center=true);
    translate([15, 13, 0]) color("brown") cube([1, 1, 1],center=true);
    translate([15, 13, 1]) color("brown") cube([1, 1, 1],center=true);
    translate([15, 13, 2]) color("brown") cube([1, 1, 1],center=true);
    translate([15, 14, 0]) color("brown") cube([1, 1, 1],center=true);
    translate([15, 14, 1]) color("brown") cube([1, 1, 1],center=true);
    translate([15, 14, 2]) color("brown") cube([1, 1, 1],center=true);
    translate([15, 15, 0]) color("brown") cube([1, 1, 1],center=true);
    translate([15, 15, 1]) color("brown") cube([1, 1, 1],center=true);
    translate([15, 15, 2]) color("brown") cube([1, 1, 1],center=true);
}
